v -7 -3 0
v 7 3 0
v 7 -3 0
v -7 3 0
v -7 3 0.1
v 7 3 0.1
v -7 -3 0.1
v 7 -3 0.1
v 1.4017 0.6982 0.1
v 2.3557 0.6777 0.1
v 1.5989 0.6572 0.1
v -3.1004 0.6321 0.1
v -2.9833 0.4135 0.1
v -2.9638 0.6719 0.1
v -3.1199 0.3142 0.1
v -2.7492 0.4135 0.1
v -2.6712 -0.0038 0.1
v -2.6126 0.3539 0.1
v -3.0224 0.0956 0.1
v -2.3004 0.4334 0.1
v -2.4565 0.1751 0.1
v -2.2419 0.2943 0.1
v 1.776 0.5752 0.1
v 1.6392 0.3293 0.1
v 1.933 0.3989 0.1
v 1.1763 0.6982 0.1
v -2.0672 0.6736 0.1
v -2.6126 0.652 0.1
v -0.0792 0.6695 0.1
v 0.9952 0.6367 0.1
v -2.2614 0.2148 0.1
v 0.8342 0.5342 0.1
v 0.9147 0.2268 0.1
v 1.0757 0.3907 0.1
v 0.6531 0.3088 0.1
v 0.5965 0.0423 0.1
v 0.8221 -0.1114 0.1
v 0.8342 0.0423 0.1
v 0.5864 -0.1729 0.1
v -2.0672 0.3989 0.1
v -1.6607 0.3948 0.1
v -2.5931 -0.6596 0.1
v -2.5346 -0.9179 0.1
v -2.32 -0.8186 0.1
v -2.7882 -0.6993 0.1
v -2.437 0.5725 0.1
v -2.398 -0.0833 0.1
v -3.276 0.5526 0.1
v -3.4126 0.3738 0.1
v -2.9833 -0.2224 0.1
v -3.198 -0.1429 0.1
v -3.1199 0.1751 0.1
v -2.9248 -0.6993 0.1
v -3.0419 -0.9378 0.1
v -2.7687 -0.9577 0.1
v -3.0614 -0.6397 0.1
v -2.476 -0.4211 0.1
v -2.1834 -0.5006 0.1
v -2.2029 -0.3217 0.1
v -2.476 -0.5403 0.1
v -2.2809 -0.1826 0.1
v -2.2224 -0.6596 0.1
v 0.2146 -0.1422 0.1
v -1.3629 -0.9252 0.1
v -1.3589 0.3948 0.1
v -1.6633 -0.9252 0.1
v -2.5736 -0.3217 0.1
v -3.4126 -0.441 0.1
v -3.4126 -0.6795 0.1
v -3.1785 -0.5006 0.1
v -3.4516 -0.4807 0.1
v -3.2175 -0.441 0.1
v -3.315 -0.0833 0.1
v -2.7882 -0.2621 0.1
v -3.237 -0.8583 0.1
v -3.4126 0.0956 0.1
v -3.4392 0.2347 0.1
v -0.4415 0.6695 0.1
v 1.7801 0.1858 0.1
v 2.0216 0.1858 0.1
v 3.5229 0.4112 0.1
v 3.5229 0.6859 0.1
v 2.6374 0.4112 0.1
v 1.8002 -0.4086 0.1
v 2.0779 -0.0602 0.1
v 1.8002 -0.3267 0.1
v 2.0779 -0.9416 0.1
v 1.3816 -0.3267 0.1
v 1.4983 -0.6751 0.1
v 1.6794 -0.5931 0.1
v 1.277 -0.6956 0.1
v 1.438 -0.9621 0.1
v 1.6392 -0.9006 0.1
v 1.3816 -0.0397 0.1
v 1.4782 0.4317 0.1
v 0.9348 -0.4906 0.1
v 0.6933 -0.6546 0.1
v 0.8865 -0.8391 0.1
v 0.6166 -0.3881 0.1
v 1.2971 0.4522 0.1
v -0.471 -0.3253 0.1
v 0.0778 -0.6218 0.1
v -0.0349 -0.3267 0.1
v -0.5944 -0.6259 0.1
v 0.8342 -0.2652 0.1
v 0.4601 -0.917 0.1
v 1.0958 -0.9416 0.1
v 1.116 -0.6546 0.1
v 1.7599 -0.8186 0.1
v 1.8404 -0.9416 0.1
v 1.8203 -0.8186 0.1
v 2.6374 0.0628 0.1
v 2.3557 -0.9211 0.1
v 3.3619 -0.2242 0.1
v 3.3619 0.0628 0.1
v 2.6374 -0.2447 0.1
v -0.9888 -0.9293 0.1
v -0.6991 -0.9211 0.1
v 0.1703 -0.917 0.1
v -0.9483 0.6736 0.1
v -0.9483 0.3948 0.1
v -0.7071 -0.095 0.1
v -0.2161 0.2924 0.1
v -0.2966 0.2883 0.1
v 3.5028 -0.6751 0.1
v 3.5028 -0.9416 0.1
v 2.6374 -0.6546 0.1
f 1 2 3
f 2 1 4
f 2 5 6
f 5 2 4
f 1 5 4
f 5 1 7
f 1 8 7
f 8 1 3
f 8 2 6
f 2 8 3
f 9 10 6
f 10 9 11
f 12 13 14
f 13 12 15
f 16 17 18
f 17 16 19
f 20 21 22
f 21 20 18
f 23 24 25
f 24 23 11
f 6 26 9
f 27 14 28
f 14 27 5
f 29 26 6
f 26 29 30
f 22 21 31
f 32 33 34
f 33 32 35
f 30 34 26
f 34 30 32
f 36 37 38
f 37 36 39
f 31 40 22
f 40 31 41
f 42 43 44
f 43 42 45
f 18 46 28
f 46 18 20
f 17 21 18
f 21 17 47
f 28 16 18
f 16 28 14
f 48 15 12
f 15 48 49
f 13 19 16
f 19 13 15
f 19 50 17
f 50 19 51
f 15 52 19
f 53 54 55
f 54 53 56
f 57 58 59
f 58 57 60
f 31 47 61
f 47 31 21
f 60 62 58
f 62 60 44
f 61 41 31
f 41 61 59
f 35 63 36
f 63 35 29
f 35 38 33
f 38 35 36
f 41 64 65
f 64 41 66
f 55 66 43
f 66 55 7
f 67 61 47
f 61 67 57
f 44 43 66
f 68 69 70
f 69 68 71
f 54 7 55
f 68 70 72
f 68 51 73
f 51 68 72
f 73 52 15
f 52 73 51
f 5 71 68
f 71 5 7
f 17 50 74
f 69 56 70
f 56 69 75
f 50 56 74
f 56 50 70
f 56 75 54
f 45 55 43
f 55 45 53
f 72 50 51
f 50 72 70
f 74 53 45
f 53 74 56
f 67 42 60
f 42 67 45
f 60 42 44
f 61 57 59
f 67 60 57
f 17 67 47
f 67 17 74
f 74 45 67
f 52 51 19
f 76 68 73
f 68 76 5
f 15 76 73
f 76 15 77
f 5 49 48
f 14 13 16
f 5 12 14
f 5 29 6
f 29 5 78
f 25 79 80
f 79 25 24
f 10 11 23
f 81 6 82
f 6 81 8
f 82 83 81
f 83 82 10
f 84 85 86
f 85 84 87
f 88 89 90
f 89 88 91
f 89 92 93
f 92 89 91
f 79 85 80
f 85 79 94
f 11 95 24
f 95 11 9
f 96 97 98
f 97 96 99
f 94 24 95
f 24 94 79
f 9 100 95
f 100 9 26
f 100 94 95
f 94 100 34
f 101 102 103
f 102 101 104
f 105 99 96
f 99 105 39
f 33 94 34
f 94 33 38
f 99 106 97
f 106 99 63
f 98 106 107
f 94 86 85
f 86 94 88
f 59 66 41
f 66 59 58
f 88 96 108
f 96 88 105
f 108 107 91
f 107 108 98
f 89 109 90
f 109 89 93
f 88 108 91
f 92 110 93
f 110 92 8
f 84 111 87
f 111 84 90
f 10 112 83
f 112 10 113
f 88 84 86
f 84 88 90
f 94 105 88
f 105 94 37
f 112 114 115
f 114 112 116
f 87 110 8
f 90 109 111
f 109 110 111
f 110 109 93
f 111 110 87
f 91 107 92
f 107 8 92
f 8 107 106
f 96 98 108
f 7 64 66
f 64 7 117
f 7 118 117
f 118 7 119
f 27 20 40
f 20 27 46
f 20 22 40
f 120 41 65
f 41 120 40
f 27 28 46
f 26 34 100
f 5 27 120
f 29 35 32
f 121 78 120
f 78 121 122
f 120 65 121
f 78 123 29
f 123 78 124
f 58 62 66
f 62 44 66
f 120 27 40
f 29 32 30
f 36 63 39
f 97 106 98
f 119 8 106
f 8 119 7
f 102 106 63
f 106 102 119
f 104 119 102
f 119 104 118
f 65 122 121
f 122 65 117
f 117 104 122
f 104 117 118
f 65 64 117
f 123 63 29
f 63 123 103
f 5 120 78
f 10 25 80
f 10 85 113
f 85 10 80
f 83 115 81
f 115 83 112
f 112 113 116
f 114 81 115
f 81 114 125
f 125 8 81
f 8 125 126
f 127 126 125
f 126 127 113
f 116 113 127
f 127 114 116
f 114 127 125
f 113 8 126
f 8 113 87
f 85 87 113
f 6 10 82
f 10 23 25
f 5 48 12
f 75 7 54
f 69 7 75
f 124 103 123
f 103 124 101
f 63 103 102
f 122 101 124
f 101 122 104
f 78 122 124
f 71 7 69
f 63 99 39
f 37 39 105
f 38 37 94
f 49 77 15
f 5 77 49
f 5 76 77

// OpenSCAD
// file: ../p/box5-12.scad
use <../lib.scad>
function ldraw_lib__box5_12() = [
// 0 Box with 5 Faces without Any Edges
// 0 Name: box5-12.dat
// 0 Author: Chris Dee [cwdee]
// 0 !LDRAW_ORG Primitive UPDATE 2009-02
// 0 !LICENSE Licensed under CC BY 4.0 : see CAreadme.txt
// 
// 0 BFC CERTIFY CCW
  [0,"BFC","CERTIFY"],
  [0,"BFC","CCW"],
// 
// 0 !HISTORY 2009-09-03 [PTadmin] Official Update 2009-02
// 
// 
// 4 16 1 1 1 1 1 -1 -1 1 -1 -1 1 1
  [4,16,1,1,1,1,1,-1,-1,1,-1,-1,1,1],
// 4 16 -1 0 1 1 0 1 1 1 1 -1 1 1
  [4,16,-1,0,1,1,0,1,1,1,1,-1,1,1],
// 4 16 -1 0 -1 -1 0 1 -1 1 1 -1 1 -1
  [4,16,-1,0,-1,-1,0,1,-1,1,1,-1,1,-1],
// 4 16 1 0 -1 -1 0 -1 -1 1 -1 1 1 -1
  [4,16,1,0,-1,-1,0,-1,-1,1,-1,1,1,-1],
// 4 16 1 0 1 1 0 -1 1 1 -1 1 1 1
  [4,16,1,0,1,1,0,-1,1,1,-1,1,1,1],
// 0
];
module ldraw_lib__box5_12(step=0, col=false, unit=2/5, alt=false, line=0.2, solid=!$preview)
    makepoly(ldraw_lib__box5_12(), step=step, col=col, unit=unit, alt=alt, line=line, solid=solid);
ldraw_lib__box5_12(line=0.2);
// main file
use <../lib.scad>
use <../p/box5-12.scad>
function ldraw_lib__6255869g() = [
// 0 Sticker  0.8 x  1.8 with Silver "STAGE"
// 0 Name: 6255869g.dat
// 0 Author: Magnus Forsberg [MagFors]
// 0 !LDRAW_ORG Part UPDATE 2024-08
// 0 !LICENSE Licensed under CC BY 4.0 : see CAreadme.txt
// 
// 0 BFC CERTIFY CCW
  [0,"BFC","CERTIFY"],
  [0,"BFC","CCW"],
// 
// 0 !KEYWORDS Bricklink 75893stk01, Brickowl 472633, Dodge, Rebrickable 49146
// 0 !KEYWORDS set 75893, Speed Champions
// 
// 0 !HISTORY 2024-09-30 [OrionP] Official Update 2024-08
// 
// 
// 1 16 0 -0.25 0 17.5 0 0 0 0.25 0 0 0 7.5 box5-12.dat
  [1,16,0,-0.25,0,17.5,0,0,0,0.25,0,0,0,7.5, ldraw_lib__box5_12()],
// 4 0 5.88926 -0.25 1.69427 17.5 -0.25 7.5 3.50432 -0.25 1.74552 3.99737 -0.25 1.64303
  [4,0,5.88926,-0.25,1.69427,17.5,-0.25,7.5,3.50432,-0.25,1.74552,3.99737,-0.25,1.64303],
// 4 80 -7.45835 -0.25 1.03385 -7.40958 -0.25 1.67971 -7.75102 -0.25 1.58034 -7.7998 -0.25 0.78544
  [4,80,-7.45835,-0.25,1.03385,-7.40958,-0.25,1.67971,-7.75102,-0.25,1.58034,-7.7998,-0.25,0.78544],
// 4 0 -6.67791 -0.25 -0.00946 -6.53157 -0.25 0.8848 -6.87302 -0.25 1.03385 -7.55591 -0.25 0.23895
  [4,0,-6.67791,-0.25,-0.00946,-6.53157,-0.25,0.8848,-6.87302,-0.25,1.03385,-7.55591,-0.25,0.23895],
// 4 80 -6.14135 -0.25 0.43767 -5.60479 -0.25 0.73576 -5.75112 -0.25 1.08353 -6.53157 -0.25 0.8848
  [4,80,-6.14135,-0.25,0.43767,-5.60479,-0.25,0.73576,-5.75112,-0.25,1.08353,-6.53157,-0.25,0.8848],
// 4 80 4.09799 -0.25 0.82314 4.83254 -0.25 0.99737 4.44011 -0.25 1.43806 3.99737 -0.25 1.64303
  [4,80,4.09799,-0.25,0.82314,4.83254,-0.25,0.99737,4.44011,-0.25,1.43806,3.99737,-0.25,1.64303],
// 3 0 17.5 -0.25 7.5 2.94083 -0.25 1.74552 3.50432 -0.25 1.74552
  [3,0,17.5,-0.25,7.5,2.94083,-0.25,1.74552,3.50432,-0.25,1.74552],
// 4 0 -5.16812 -0.25 1.68403 -17.5 -0.25 7.5 -7.40958 -0.25 1.67971 -6.53157 -0.25 1.63002
  [4,0,-5.16812,-0.25,1.68403,-17.5,-0.25,7.5,-7.40958,-0.25,1.67971,-6.53157,-0.25,1.63002],
// 4 0 2.94083 -0.25 1.74552 17.5 -0.25 7.5 -0.19804 -0.25 1.67378 2.48803 -0.25 1.59179
  [4,0,2.94083,-0.25,1.74552,17.5,-0.25,7.5,-0.19804,-0.25,1.67378,2.48803,-0.25,1.59179],
// 3 80 -5.60479 -0.25 0.73576 -6.14135 -0.25 0.43767 -5.65357 -0.25 0.53703
  [3,80,-5.60479,-0.25,0.73576,-6.14135,-0.25,0.43767,-5.65357,-0.25,0.53703],
// 4 80 2.28678 -0.25 0.56693 2.68927 -0.25 0.97687 2.08553 -0.25 1.33557 1.63273 -0.25 0.7719
  [4,80,2.28678,-0.25,0.56693,2.68927,-0.25,0.97687,2.08553,-0.25,1.33557,1.63273,-0.25,0.7719],
// 4 80 2.68927 -0.25 0.97687 2.94083 -0.25 1.74552 2.48803 -0.25 1.59179 2.08553 -0.25 1.33557
  [4,80,2.68927,-0.25,0.97687,2.94083,-0.25,1.74552,2.48803,-0.25,1.59179,2.08553,-0.25,1.33557],
// 4 80 1.49117 -0.25 0.10574 1.46602 -0.25 -0.43231 2.05535 -0.25 -0.27858 2.08553 -0.25 0.10574
  [4,80,1.49117,-0.25,0.10574,1.46602,-0.25,-0.43231,2.05535,-0.25,-0.27858,2.08553,-0.25,0.10574],
// 4 0 -5.16812 -0.25 0.99737 -5.60479 -0.25 0.73576 -5.65357 -0.25 0.53703 -4.15183 -0.25 0.98712
  [4,0,-5.16812,-0.25,0.99737,-5.60479,-0.25,0.73576,-5.65357,-0.25,0.53703,-4.15183,-0.25,0.98712],
// 4 80 -6.33646 -0.25 -2.2948 -5.7999 -0.25 -2.0464 -6.48279 -0.25 -1.64895 -6.97057 -0.25 -1.74831
  [4,80,-6.33646,-0.25,-2.2948,-5.7999,-0.25,-2.0464,-6.48279,-0.25,-1.64895,-6.97057,-0.25,-1.74831],
// 4 80 -6.53157 -0.25 0.8848 -5.75112 -0.25 1.08353 -6.09257 -0.25 1.4313 -6.53157 -0.25 1.63002
  [4,80,-6.53157,-0.25,0.8848,-5.75112,-0.25,1.08353,-6.09257,-0.25,1.4313,-6.53157,-0.25,1.63002],
// 4 0 -6.14135 -0.25 0.43767 -6.53157 -0.25 0.8848 -6.67791 -0.25 -0.00946 -5.99501 -0.25 -0.20819
  [4,0,-6.14135,-0.25,0.43767,-6.53157,-0.25,0.8848,-6.67791,-0.25,-0.00946,-5.99501,-0.25,-0.20819],
// 4 80 -6.87302 -0.25 1.03385 -6.53157 -0.25 0.8848 -6.53157 -0.25 1.63002 -7.40958 -0.25 1.67971
  [4,80,-6.87302,-0.25,1.03385,-6.53157,-0.25,0.8848,-6.53157,-0.25,1.63002,-7.40958,-0.25,1.67971],
// 4 80 -7.7998 -0.25 0.78544 -7.75102 -0.25 1.58034 -8.19003 -0.25 1.38162 -8.53147 -0.25 0.93449
  [4,80,-7.7998,-0.25,0.78544,-7.75102,-0.25,1.58034,-8.19003,-0.25,1.38162,-8.53147,-0.25,0.93449],
// 4 0 -7.55591 -0.25 0.23895 -6.87302 -0.25 1.03385 -7.45835 -0.25 1.03385 -7.7998 -0.25 0.78544
  [4,0,-7.55591,-0.25,0.23895,-6.87302,-0.25,1.03385,-7.45835,-0.25,1.03385,-7.7998,-0.25,0.78544],
// 4 80 -7.55591 -0.25 0.23895 -7.99491 -0.25 -0.35723 -7.45835 -0.25 -0.55596 -6.67791 -0.25 -0.00946
  [4,80,-7.55591,-0.25,0.23895,-7.99491,-0.25,-0.35723,-7.45835,-0.25,-0.55596,-6.67791,-0.25,-0.00946],
// 3 0 -7.7998 -0.25 0.78544 -7.7998 -0.25 0.43767 -7.55591 -0.25 0.23895
  [3,0,-7.7998,-0.25,0.78544,-7.7998,-0.25,0.43767,-7.55591,-0.25,0.23895],
// 4 80 -7.31202 -0.25 -1.74831 -7.65347 -0.25 -1.59926 -7.60469 -0.25 -2.34448 -6.9218 -0.25 -2.39417
  [4,80,-7.31202,-0.25,-1.74831,-7.65347,-0.25,-1.59926,-7.60469,-0.25,-2.34448,-6.9218,-0.25,-2.39417],
// 4 80 -5.45845 -0.25 -1.25149 -5.50723 -0.25 -0.80436 -6.19012 -0.25 -1.05277 -6.19012 -0.25 -1.35086
  [4,80,-5.45845,-0.25,-1.25149,-5.50723,-0.25,-0.80436,-6.19012,-0.25,-1.05277,-6.19012,-0.25,-1.35086],
// 4 0 -5.65357 -0.25 0.53703 -6.14135 -0.25 0.43767 -5.99501 -0.25 -0.20819 -5.70234 -0.25 -0.45659
  [4,0,-5.65357,-0.25,0.53703,-6.14135,-0.25,0.43767,-5.99501,-0.25,-0.20819,-5.70234,-0.25,-0.45659],
// 4 80 -6.19012 -0.25 -1.35086 -5.7999 -0.25 -2.0464 -5.55601 -0.25 -1.64895 -5.45845 -0.25 -1.25149
  [4,80,-6.19012,-0.25,-1.35086,-5.7999,-0.25,-2.0464,-5.55601,-0.25,-1.64895,-5.45845,-0.25,-1.25149],
// 4 0 -4.15183 -0.25 0.98712 -5.65357 -0.25 0.53703 -5.70234 -0.25 -0.45659 -5.50723 -0.25 -0.80436
  [4,0,-4.15183,-0.25,0.98712,-5.65357,-0.25,0.53703,-5.70234,-0.25,-0.45659,-5.50723,-0.25,-0.80436],
// 4 0 0.5365 -0.25 -0.35545 1.49117 -0.25 0.10574 1.63273 -0.25 0.7719 -0.19804 -0.25 1.67378
  [4,0,0.5365,-0.25,-0.35545,1.49117,-0.25,0.10574,1.63273,-0.25,0.7719,-0.19804,-0.25,1.67378],
// 4 80 1.63273 -0.25 0.7719 1.49117 -0.25 0.10574 2.08553 -0.25 0.10574 2.28678 -0.25 0.56693
  [4,80,1.63273,-0.25,0.7719,1.49117,-0.25,0.10574,2.08553,-0.25,0.10574,2.28678,-0.25,0.56693],
// 4 80 -4.15817 -0.25 -2.31293 -3.40723 -0.25 -2.31293 -3.39716 -0.25 0.98712 -4.15183 -0.25 0.98712
  [4,80,-4.15817,-0.25,-2.31293,-3.40723,-0.25,-2.31293,-3.39716,-0.25,0.98712,-4.15183,-0.25,0.98712],
// 4 0 -6.33646 -0.25 -2.2948 -6.9218 -0.25 -2.39417 -17.5 -0.25 -7.5 -4.15817 -0.25 -2.31293
  [4,0,-6.33646,-0.25,-2.2948,-6.9218,-0.25,-2.39417,-17.5,-0.25,-7.5,-4.15817,-0.25,-2.31293],
// 4 80 -6.43401 -0.25 -0.80436 -6.19012 -0.25 -1.05277 -5.70234 -0.25 -0.45659 -5.99501 -0.25 -0.20819
  [4,80,-6.43401,-0.25,-0.80436,-6.19012,-0.25,-1.05277,-5.70234,-0.25,-0.45659,-5.99501,-0.25,-0.20819],
// 3 0 -5.7999 -0.25 -2.0464 -6.33646 -0.25 -2.2948 -4.15817 -0.25 -2.31293
  [3,0,-5.7999,-0.25,-2.0464,-6.33646,-0.25,-2.2948,-4.15817,-0.25,-2.31293],
// 4 80 -8.62903 -0.25 -1.20181 -8.53147 -0.25 -1.69863 -7.94613 -0.25 -1.25149 -8.53147 -0.25 -1.10245
  [4,80,-8.62903,-0.25,-1.20181,-8.53147,-0.25,-1.69863,-7.94613,-0.25,-1.25149,-8.53147,-0.25,-1.10245],
// 3 0 -7.60469 -0.25 -2.34448 -17.5 -0.25 -7.5 -6.9218 -0.25 -2.39417
  [3,0,-7.60469,-0.25,-2.34448,-17.5,-0.25,-7.5,-6.9218,-0.25,-2.39417],
// 3 80 -8.53147 -0.25 -1.10245 -7.94613 -0.25 -1.25149 -8.04369 -0.25 -1.10245
  [3,80,-8.53147,-0.25,-1.10245,-7.94613,-0.25,-1.25149,-8.04369,-0.25,-1.10245],
// 4 0 -7.99491 -0.25 -0.35723 -8.28758 -0.25 -0.20819 -8.53147 -0.25 -1.10245 -8.04369 -0.25 -1.10245
  [4,0,-7.99491,-0.25,-0.35723,-8.28758,-0.25,-0.20819,-8.53147,-0.25,-1.10245,-8.04369,-0.25,-1.10245],
// 4 80 -7.99491 -0.25 -0.35723 -7.7998 -0.25 0.43767 -7.7998 -0.25 0.78544 -8.28758 -0.25 -0.20819
  [4,80,-7.99491,-0.25,-0.35723,-7.7998,-0.25,0.43767,-7.7998,-0.25,0.78544,-8.28758,-0.25,-0.20819],
// 4 0 -17.5 -0.25 -7.5 -8.62903 -0.25 -1.20181 -8.53147 -0.25 -1.10245 -17.5 -0.25 7.5
  [4,0,-17.5,-0.25,-7.5,-8.62903,-0.25,-1.20181,-8.53147,-0.25,-1.10245,-17.5,-0.25,7.5],
// 3 80 -6.67791 -0.25 -0.00946 -7.45835 -0.25 -0.55596 -6.97057 -0.25 -0.65532
  [3,80,-6.67791,-0.25,-0.00946,-7.45835,-0.25,-0.55596,-6.97057,-0.25,-0.65532],
// 4 80 -7.65347 -0.25 -1.59926 -7.94613 -0.25 -1.25149 -8.53147 -0.25 -1.69863 -8.09247 -0.25 -2.14576
  [4,80,-7.65347,-0.25,-1.59926,-7.94613,-0.25,-1.25149,-8.53147,-0.25,-1.69863,-8.09247,-0.25,-2.14576],
// 4 0 -7.65347 -0.25 -1.59926 -6.97057 -0.25 -0.65532 -7.45835 -0.25 -0.55596 -7.94613 -0.25 -1.25149
  [4,0,-7.65347,-0.25,-1.59926,-6.97057,-0.25,-0.65532,-7.45835,-0.25,-0.55596,-7.94613,-0.25,-1.25149],
// 3 80 -7.65347 -0.25 -1.59926 -8.09247 -0.25 -2.14576 -7.60469 -0.25 -2.34448
  [3,80,-7.65347,-0.25,-1.59926,-8.09247,-0.25,-2.14576,-7.60469,-0.25,-2.34448],
// 4 80 -6.97057 -0.25 -1.74831 -7.31202 -0.25 -1.74831 -6.9218 -0.25 -2.39417 -6.33646 -0.25 -2.2948
  [4,80,-6.97057,-0.25,-1.74831,-7.31202,-0.25,-1.74831,-6.9218,-0.25,-2.39417,-6.33646,-0.25,-2.2948],
// 4 0 -8.04369 -0.25 -1.10245 -7.94613 -0.25 -1.25149 -7.45835 -0.25 -0.55596 -7.99491 -0.25 -0.35723
  [4,0,-8.04369,-0.25,-1.10245,-7.94613,-0.25,-1.25149,-7.45835,-0.25,-0.55596,-7.99491,-0.25,-0.35723],
// 4 0 -6.97057 -0.25 -0.65532 -7.65347 -0.25 -1.59926 -7.31202 -0.25 -1.74831 -6.97057 -0.25 -1.74831
  [4,0,-6.97057,-0.25,-0.65532,-7.65347,-0.25,-1.59926,-7.31202,-0.25,-1.74831,-6.97057,-0.25,-1.74831],
// 4 0 -6.43401 -0.25 -0.80436 -6.97057 -0.25 -1.74831 -6.48279 -0.25 -1.64895 -6.19012 -0.25 -1.35086
  [4,0,-6.43401,-0.25,-0.80436,-6.97057,-0.25,-1.74831,-6.48279,-0.25,-1.64895,-6.19012,-0.25,-1.35086],
// 3 80 -6.19012 -0.25 -1.35086 -6.48279 -0.25 -1.64895 -5.7999 -0.25 -2.0464
  [3,80,-6.19012,-0.25,-1.35086,-6.48279,-0.25,-1.64895,-5.7999,-0.25,-2.0464],
// 3 80 -5.70234 -0.25 -0.45659 -6.19012 -0.25 -1.05277 -5.50723 -0.25 -0.80436
  [3,80,-5.70234,-0.25,-0.45659,-6.19012,-0.25,-1.05277,-5.50723,-0.25,-0.80436],
// 3 0 -6.43401 -0.25 -0.80436 -6.19012 -0.25 -1.35086 -6.19012 -0.25 -1.05277
  [3,0,-6.43401,-0.25,-0.80436,-6.19012,-0.25,-1.35086,-6.19012,-0.25,-1.05277],
// 4 80 -6.43401 -0.25 -0.80436 -5.99501 -0.25 -0.20819 -6.67791 -0.25 -0.00946 -6.97057 -0.25 -0.65532
  [4,80,-6.43401,-0.25,-0.80436,-5.99501,-0.25,-0.20819,-6.67791,-0.25,-0.00946,-6.97057,-0.25,-0.65532],
// 3 0 -6.97057 -0.25 -0.65532 -6.97057 -0.25 -1.74831 -6.43401 -0.25 -0.80436
  [3,0,-6.97057,-0.25,-0.65532,-6.97057,-0.25,-1.74831,-6.43401,-0.25,-0.80436],
// 3 80 -7.7998 -0.25 0.43767 -7.99491 -0.25 -0.35723 -7.55591 -0.25 0.23895
  [3,80,-7.7998,-0.25,0.43767,-7.99491,-0.25,-0.35723,-7.55591,-0.25,0.23895],
// 4 0 -17.5 -0.25 7.5 -8.53147 -0.25 -1.10245 -8.28758 -0.25 -0.20819 -8.53147 -0.25 0.23895
  [4,0,-17.5,-0.25,7.5,-8.53147,-0.25,-1.10245,-8.28758,-0.25,-0.20819,-8.53147,-0.25,0.23895],
// 4 80 -8.53147 -0.25 0.23895 -8.28758 -0.25 -0.20819 -7.7998 -0.25 0.78544 -8.598 -0.25 0.58672
  [4,80,-8.53147,-0.25,0.23895,-8.28758,-0.25,-0.20819,-7.7998,-0.25,0.78544,-8.598,-0.25,0.58672],
// 3 0 -17.5 -0.25 7.5 -8.53147 -0.25 0.93449 -8.19003 -0.25 1.38162
  [3,0,-17.5,-0.25,7.5,-8.53147,-0.25,0.93449,-8.19003,-0.25,1.38162],
// 3 80 -7.40958 -0.25 1.67971 -7.45835 -0.25 1.03385 -6.87302 -0.25 1.03385
  [3,80,-7.40958,-0.25,1.67971,-7.45835,-0.25,1.03385,-6.87302,-0.25,1.03385],
// 3 0 -17.5 -0.25 7.5 -7.75102 -0.25 1.58034 -7.40958 -0.25 1.67971
  [3,0,-17.5,-0.25,7.5,-7.75102,-0.25,1.58034,-7.40958,-0.25,1.67971],
// 4 0 17.5 -0.25 7.5 -17.5 -0.25 7.5 -1.10365 -0.25 1.67378 -0.19804 -0.25 1.67378
  [4,0,17.5,-0.25,7.5,-17.5,-0.25,7.5,-1.10365,-0.25,1.67378,-0.19804,-0.25,1.67378],
// 4 80 4.45017 -0.25 0.46444 5.05391 -0.25 0.46444 4.83254 -0.25 0.99737 4.09799 -0.25 0.82314
  [4,80,4.45017,-0.25,0.46444,5.05391,-0.25,0.46444,4.83254,-0.25,0.99737,4.09799,-0.25,0.82314],
// 3 0 5.88926 -0.25 1.69427 3.99737 -0.25 1.64303 4.44011 -0.25 1.43806
  [3,0,5.88926,-0.25,1.69427,3.99737,-0.25,1.64303,4.44011,-0.25,1.43806],
// 4 0 8.80732 -0.25 1.02811 17.5 -0.25 -7.5 17.5 -0.25 7.5 8.80732 -0.25 1.71477
  [4,0,8.80732,-0.25,1.02811,17.5,-0.25,-7.5,17.5,-0.25,7.5,8.80732,-0.25,1.71477],
// 4 80 8.80732 -0.25 1.71477 5.88926 -0.25 1.69427 6.59362 -0.25 1.02811 8.80732 -0.25 1.02811
  [4,80,8.80732,-0.25,1.71477,5.88926,-0.25,1.69427,6.59362,-0.25,1.02811,8.80732,-0.25,1.02811],
// 4 80 4.50048 -0.25 -1.02161 5.19478 -0.25 -2.35393 5.19478 -0.25 -0.15048 4.50048 -0.25 -0.81664
  [4,80,4.50048,-0.25,-1.02161,5.19478,-0.25,-2.35393,5.19478,-0.25,-0.15048,4.50048,-0.25,-0.81664],
// 4 0 3.74581 -0.25 -1.68777 4.19861 -0.25 -1.4828 3.454 -0.25 -0.81664 3.19238 -0.25 -1.73901
  [4,0,3.74581,-0.25,-1.68777,4.19861,-0.25,-1.4828,3.454,-0.25,-0.81664,3.19238,-0.25,-1.73901],
// 4 80 3.74581 -0.25 -1.68777 3.19238 -0.25 -1.73901 3.59488 -0.25 -2.40517 4.09799 -0.25 -2.25144
  [4,80,3.74581,-0.25,-1.68777,3.19238,-0.25,-1.73901,3.59488,-0.25,-2.40517,4.09799,-0.25,-2.25144],
// 4 0 3.454 -0.25 -0.09923 5.19478 -0.25 -0.15048 5.05391 -0.25 0.46444 4.45017 -0.25 0.46444
  [4,0,3.454,-0.25,-0.09923,5.19478,-0.25,-0.15048,5.05391,-0.25,0.46444,4.45017,-0.25,0.46444],
// 4 80 3.6955 -0.25 1.07936 4.09799 -0.25 0.82314 3.99737 -0.25 1.64303 3.50432 -0.25 1.74552
  [4,80,3.6955,-0.25,1.07936,4.09799,-0.25,0.82314,3.99737,-0.25,1.64303,3.50432,-0.25,1.74552],
// 4 80 2.33709 -0.25 -1.22658 1.54149 -0.25 -0.97037 1.73335 -0.25 -1.63653 2.21634 -0.25 -2.09771
  [4,80,2.33709,-0.25,-1.22658,1.54149,-0.25,-0.97037,1.73335,-0.25,-1.63653,2.21634,-0.25,-2.09771],
// 4 0 3.454 -0.25 -0.09923 4.45017 -0.25 0.46444 4.09799 -0.25 0.82314 3.6955 -0.25 1.07936
  [4,0,3.454,-0.25,-0.09923,4.45017,-0.25,0.46444,4.09799,-0.25,0.82314,3.6955,-0.25,1.07936],
// 4 80 3.2427 -0.25 1.1306 3.6955 -0.25 1.07936 3.50432 -0.25 1.74552 2.94083 -0.25 1.74552
  [4,80,3.2427,-0.25,1.1306,3.6955,-0.25,1.07936,3.50432,-0.25,1.74552,2.94083,-0.25,1.74552],
// 4 0 3.454 -0.25 -0.09923 3.6955 -0.25 1.07936 3.2427 -0.25 1.1306 2.68927 -0.25 0.97687
  [4,0,3.454,-0.25,-0.09923,3.6955,-0.25,1.07936,3.2427,-0.25,1.1306,2.68927,-0.25,0.97687],
// 4 80 -1.17744 -0.25 -0.81322 -1.48601 -0.25 -1.56479 0.19439 -0.25 -1.55454 -0.08736 -0.25 -0.81664
  [4,80,-1.17744,-0.25,-0.81322,-1.48601,-0.25,-1.56479,0.19439,-0.25,-1.55454,-0.08736,-0.25,-0.81664],
// 4 80 2.08553 -0.25 -0.66291 1.46602 -0.25 -0.43231 1.54149 -0.25 -0.97037 2.33709 -0.25 -1.22658
  [4,80,2.08553,-0.25,-0.66291,1.46602,-0.25,-0.43231,1.54149,-0.25,-0.97037,2.33709,-0.25,-1.22658],
// 4 0 3.454 -0.25 -0.09923 2.68927 -0.25 0.97687 2.28678 -0.25 0.56693 2.08553 -0.25 0.10574
  [4,0,3.454,-0.25,-0.09923,2.68927,-0.25,0.97687,2.28678,-0.25,0.56693,2.08553,-0.25,0.10574],
// 4 0 0.5365 -0.25 -0.35545 1.1503 -0.25 -2.29244 1.73335 -0.25 -1.63653 1.54149 -0.25 -0.97037
  [4,0,0.5365,-0.25,-0.35545,1.1503,-0.25,-2.29244,1.73335,-0.25,-1.63653,1.54149,-0.25,-0.97037],
// 3 0 2.21634 -0.25 -2.09771 1.1503 -0.25 -2.29244 2.73958 -0.25 -2.35393
  [3,0,2.21634,-0.25,-2.09771,1.1503,-0.25,-2.29244,2.73958,-0.25,-2.35393],
// 4 80 3.454 -0.25 -0.09923 3.454 -0.25 -0.81664 4.50048 -0.25 -0.81664 5.19478 -0.25 -0.15048
  [4,80,3.454,-0.25,-0.09923,3.454,-0.25,-0.81664,4.50048,-0.25,-0.81664,5.19478,-0.25,-0.15048],
// 4 0 -5.50723 -0.25 -0.80436 -5.45845 -0.25 -1.25149 -4.15817 -0.25 -2.31293 -4.15183 -0.25 0.98712
  [4,0,-5.50723,-0.25,-0.80436,-5.45845,-0.25,-1.25149,-4.15817,-0.25,-2.31293,-4.15183,-0.25,0.98712],
// 4 0 3.454 -0.25 -0.81664 2.08553 -0.25 -0.66291 2.33709 -0.25 -1.22658 2.78989 -0.25 -1.63653
  [4,0,3.454,-0.25,-0.81664,2.08553,-0.25,-0.66291,2.33709,-0.25,-1.22658,2.78989,-0.25,-1.63653],
// 4 80 2.78989 -0.25 -1.63653 2.21634 -0.25 -2.09771 2.73958 -0.25 -2.35393 3.19238 -0.25 -1.73901
  [4,80,2.78989,-0.25,-1.63653,2.21634,-0.25,-2.09771,2.73958,-0.25,-2.35393,3.19238,-0.25,-1.73901],
// 4 80 3.74581 -0.25 -1.68777 4.09799 -0.25 -2.25144 4.39986 -0.25 -2.04647 4.19861 -0.25 -1.4828
  [4,80,3.74581,-0.25,-1.68777,4.09799,-0.25,-2.25144,4.39986,-0.25,-2.04647,4.19861,-0.25,-1.4828],
// 3 0 3.454 -0.25 -0.81664 2.78989 -0.25 -1.63653 3.19238 -0.25 -1.73901
  [3,0,3.454,-0.25,-0.81664,2.78989,-0.25,-1.63653,3.19238,-0.25,-1.73901],
// 4 0 4.6011 -0.25 -2.35393 4.09799 -0.25 -2.25144 3.59488 -0.25 -2.40517 17.5 -0.25 -7.5
  [4,0,4.6011,-0.25,-2.35393,4.09799,-0.25,-2.25144,3.59488,-0.25,-2.40517,17.5,-0.25,-7.5],
// 4 80 4.50048 -0.25 -1.02161 4.19861 -0.25 -1.4828 4.55079 -0.25 -2.04647 5.19478 -0.25 -2.35393
  [4,80,4.50048,-0.25,-1.02161,4.19861,-0.25,-1.4828,4.55079,-0.25,-2.04647,5.19478,-0.25,-2.35393],
// 4 80 5.88926 -0.25 -2.30269 6.59362 -0.25 0.15698 6.59362 -0.25 1.02811 5.88926 -0.25 1.69427
  [4,80,5.88926,-0.25,-2.30269,6.59362,-0.25,0.15698,6.59362,-0.25,1.02811,5.88926,-0.25,1.69427],
// 4 0 4.50048 -0.25 -1.02161 4.50048 -0.25 -0.81664 3.454 -0.25 -0.81664 4.19861 -0.25 -1.4828
  [4,0,4.50048,-0.25,-1.02161,4.50048,-0.25,-0.81664,3.454,-0.25,-0.81664,4.19861,-0.25,-1.4828],
// 4 0 2.08553 -0.25 -0.66291 3.454 -0.25 -0.81664 3.454 -0.25 -0.09923 2.05535 -0.25 -0.27858
  [4,0,2.08553,-0.25,-0.66291,3.454,-0.25,-0.81664,3.454,-0.25,-0.09923,2.05535,-0.25,-0.27858],
// 4 80 8.40483 -0.25 -0.56042 8.40483 -0.25 0.15698 6.59362 -0.25 0.15698 6.59362 -0.25 -0.61166
  [4,80,8.40483,-0.25,-0.56042,8.40483,-0.25,0.15698,6.59362,-0.25,0.15698,6.59362,-0.25,-0.61166],
// 3 0 5.19478 -0.25 -2.35393 4.6011 -0.25 -2.35393 17.5 -0.25 -7.5
  [3,0,5.19478,-0.25,-2.35393,4.6011,-0.25,-2.35393,17.5,-0.25,-7.5],
// 3 80 4.19861 -0.25 -1.4828 4.39986 -0.25 -2.04647 4.55079 -0.25 -2.04647
  [3,80,4.19861,-0.25,-1.4828,4.39986,-0.25,-2.04647,4.55079,-0.25,-2.04647],
// 4 0 4.6011 -0.25 -2.35393 4.55079 -0.25 -2.04647 4.39986 -0.25 -2.04647 4.09799 -0.25 -2.25144
  [4,0,4.6011,-0.25,-2.35393,4.55079,-0.25,-2.04647,4.39986,-0.25,-2.04647,4.09799,-0.25,-2.25144],
// 3 80 4.55079 -0.25 -2.04647 4.6011 -0.25 -2.35393 5.19478 -0.25 -2.35393
  [3,80,4.55079,-0.25,-2.04647,4.6011,-0.25,-2.35393,5.19478,-0.25,-2.35393],
// 3 80 3.19238 -0.25 -1.73901 2.73958 -0.25 -2.35393 3.59488 -0.25 -2.40517
  [3,80,3.19238,-0.25,-1.73901,2.73958,-0.25,-2.35393,3.59488,-0.25,-2.40517],
// 4 0 17.5 -0.25 -7.5 3.59488 -0.25 -2.40517 2.73958 -0.25 -2.35393 1.1503 -0.25 -2.29244
  [4,0,17.5,-0.25,-7.5,3.59488,-0.25,-2.40517,2.73958,-0.25,-2.35393,1.1503,-0.25,-2.29244],
// 3 80 2.33709 -0.25 -1.22658 2.21634 -0.25 -2.09771 2.78989 -0.25 -1.63653
  [3,80,2.33709,-0.25,-1.22658,2.21634,-0.25,-2.09771,2.78989,-0.25,-1.63653],
// 4 0 -3.40723 -0.25 -2.31293 -4.15817 -0.25 -2.31293 -17.5 -0.25 -7.5 -2.47212 -0.25 -2.32318
  [4,0,-3.40723,-0.25,-2.31293,-4.15817,-0.25,-2.31293,-17.5,-0.25,-7.5,-2.47212,-0.25,-2.32318],
// 4 0 -1.74763 -0.25 -2.30269 -2.47212 -0.25 -2.32318 -17.5 -0.25 -7.5 0.42582 -0.25 -2.29244
  [4,0,-1.74763,-0.25,-2.30269,-2.47212,-0.25,-2.32318,-17.5,-0.25,-7.5,0.42582,-0.25,-2.29244],
// 4 0 -5.16812 -0.25 0.99737 -5.16812 -0.25 1.68403 -6.09257 -0.25 1.4313 -5.75112 -0.25 1.08353
  [4,0,-5.16812,-0.25,0.99737,-5.16812,-0.25,1.68403,-6.09257,-0.25,1.4313,-5.75112,-0.25,1.08353],
// 3 0 -5.75112 -0.25 1.08353 -5.60479 -0.25 0.73576 -5.16812 -0.25 0.99737
  [3,0,-5.75112,-0.25,1.08353,-5.60479,-0.25,0.73576,-5.16812,-0.25,0.99737],
// 4 80 -4.15183 -0.25 0.98712 -3.39716 -0.25 0.98712 -2.37081 -0.25 1.68403 -5.16812 -0.25 0.99737
  [4,80,-4.15183,-0.25,0.98712,-3.39716,-0.25,0.98712,-2.37081,-0.25,1.68403,-5.16812,-0.25,0.99737],
// 3 0 -5.16812 -0.25 1.68403 -6.53157 -0.25 1.63002 -6.09257 -0.25 1.4313
  [3,0,-5.16812,-0.25,1.68403,-6.53157,-0.25,1.63002,-6.09257,-0.25,1.4313],
// 3 80 2.94083 -0.25 1.74552 2.68927 -0.25 0.97687 3.2427 -0.25 1.1306
  [3,80,2.94083,-0.25,1.74552,2.68927,-0.25,0.97687,3.2427,-0.25,1.1306],
// 3 0 -17.5 -0.25 7.5 -5.16812 -0.25 1.68403 -2.37081 -0.25 1.68403
  [3,0,-17.5,-0.25,7.5,-5.16812,-0.25,1.68403,-2.37081,-0.25,1.68403],
// 3 0 -0.19804 -0.25 1.67378 1.63273 -0.25 0.7719 2.08553 -0.25 1.33557
  [3,0,-0.19804,-0.25,1.67378,1.63273,-0.25,0.7719,2.08553,-0.25,1.33557],
// 4 0 -1.10365 -0.25 1.67378 -2.37081 -0.25 1.68403 -2.37081 -0.25 0.98712 -1.76776 -0.25 -0.23759
  [4,0,-1.10365,-0.25,1.67378,-2.37081,-0.25,1.68403,-2.37081,-0.25,0.98712,-1.76776,-0.25,-0.23759],
// 3 80 -2.37081 -0.25 1.68403 -3.39716 -0.25 0.98712 -2.37081 -0.25 0.98712
  [3,80,-2.37081,-0.25,1.68403,-3.39716,-0.25,0.98712,-2.37081,-0.25,0.98712],
// 4 80 -0.54016 -0.25 0.7309 -0.19804 -0.25 1.67378 -1.10365 -0.25 1.67378 -0.74141 -0.25 0.72066
  [4,80,-0.54016,-0.25,0.7309,-0.19804,-0.25,1.67378,-1.10365,-0.25,1.67378,-0.74141,-0.25,0.72066],
// 3 0 -5.45845 -0.25 -1.25149 -5.55601 -0.25 -1.64895 -4.15817 -0.25 -2.31293
  [3,0,-5.45845,-0.25,-1.25149,-5.55601,-0.25,-1.64895,-4.15817,-0.25,-2.31293],
// 3 0 -5.55601 -0.25 -1.64895 -5.7999 -0.25 -2.0464 -4.15817 -0.25 -2.31293
  [3,0,-5.55601,-0.25,-1.64895,-5.7999,-0.25,-2.0464,-4.15817,-0.25,-2.31293],
// 3 80 -2.37081 -0.25 1.68403 -5.16812 -0.25 1.68403 -5.16812 -0.25 0.99737
  [3,80,-2.37081,-0.25,1.68403,-5.16812,-0.25,1.68403,-5.16812,-0.25,0.99737],
// 3 0 -0.19804 -0.25 1.67378 2.08553 -0.25 1.33557 2.48803 -0.25 1.59179
  [3,0,-0.19804,-0.25,1.67378,2.08553,-0.25,1.33557,2.48803,-0.25,1.59179],
// 3 0 1.49117 -0.25 0.10574 0.5365 -0.25 -0.35545 1.46602 -0.25 -0.43231
  [3,0,1.49117,-0.25,0.10574,0.5365,-0.25,-0.35545,1.46602,-0.25,-0.43231],
// 3 0 1.73335 -0.25 -1.63653 1.1503 -0.25 -2.29244 2.21634 -0.25 -2.09771
  [3,0,1.73335,-0.25,-1.63653,1.1503,-0.25,-2.29244,2.21634,-0.25,-2.09771],
// 4 0 17.5 -0.25 -7.5 1.1503 -0.25 -2.29244 0.42582 -0.25 -2.29244 -17.5 -0.25 -7.5
  [4,0,17.5,-0.25,-7.5,1.1503,-0.25,-2.29244,0.42582,-0.25,-2.29244,-17.5,-0.25,-7.5],
// 4 80 0.19439 -0.25 -1.55454 0.42582 -0.25 -2.29244 1.1503 -0.25 -2.29244 0.5365 -0.25 -0.35545
  [4,80,0.19439,-0.25,-1.55454,0.42582,-0.25,-2.29244,1.1503,-0.25,-2.29244,0.5365,-0.25,-0.35545],
// 4 0 0.42582 -0.25 -2.29244 0.19439 -0.25 -1.55454 -1.48601 -0.25 -1.56479 -1.74763 -0.25 -2.30269
  [4,0,0.42582,-0.25,-2.29244,0.19439,-0.25,-1.55454,-1.48601,-0.25,-1.56479,-1.74763,-0.25,-2.30269],
// 4 0 -2.47212 -0.25 -2.32318 -1.76776 -0.25 -0.23759 -2.37081 -0.25 0.98712 -3.39716 -0.25 0.98712
  [4,0,-2.47212,-0.25,-2.32318,-1.76776,-0.25,-0.23759,-2.37081,-0.25,0.98712,-3.39716,-0.25,0.98712],
// 4 80 -2.47212 -0.25 -2.32318 -1.74763 -0.25 -2.30269 -1.48601 -0.25 -1.56479 -1.76776 -0.25 -0.23759
  [4,80,-2.47212,-0.25,-2.32318,-1.74763,-0.25,-2.30269,-1.48601,-0.25,-1.56479,-1.76776,-0.25,-0.23759],
// 3 0 -3.39716 -0.25 0.98712 -3.40723 -0.25 -2.31293 -2.47212 -0.25 -2.32318
  [3,0,-3.39716,-0.25,0.98712,-3.40723,-0.25,-2.31293,-2.47212,-0.25,-2.32318],
// 4 80 0.5365 -0.25 -0.35545 -0.19804 -0.25 1.67378 -0.54016 -0.25 0.7309 -0.08736 -0.25 -0.81664
  [4,80,0.5365,-0.25,-0.35545,-0.19804,-0.25,1.67378,-0.54016,-0.25,0.7309,-0.08736,-0.25,-0.81664],
// 3 0 -17.5 -0.25 7.5 -2.37081 -0.25 1.68403 -1.10365 -0.25 1.67378
  [3,0,-17.5,-0.25,7.5,-2.37081,-0.25,1.68403,-1.10365,-0.25,1.67378],
// 3 0 5.88926 -0.25 1.69427 4.83254 -0.25 0.99737 5.05391 -0.25 0.46444
  [3,0,5.88926,-0.25,1.69427,4.83254,-0.25,0.99737,5.05391,-0.25,0.46444],
// 4 0 5.88926 -0.25 -2.30269 5.88926 -0.25 1.69427 5.05391 -0.25 0.46444 5.19478 -0.25 -0.15048
  [4,0,5.88926,-0.25,-2.30269,5.88926,-0.25,1.69427,5.05391,-0.25,0.46444,5.19478,-0.25,-0.15048],
// 4 0 8.40483 -0.25 0.15698 8.80732 -0.25 1.02811 6.59362 -0.25 1.02811 6.59362 -0.25 0.15698
  [4,0,8.40483,-0.25,0.15698,8.80732,-0.25,1.02811,6.59362,-0.25,1.02811,6.59362,-0.25,0.15698],
// 3 80 6.59362 -0.25 0.15698 5.88926 -0.25 -2.30269 6.59362 -0.25 -0.61166
  [3,80,6.59362,-0.25,0.15698,5.88926,-0.25,-2.30269,6.59362,-0.25,-0.61166],
// 4 0 8.80732 -0.25 1.02811 8.40483 -0.25 0.15698 8.40483 -0.25 -0.56042 8.75701 -0.25 -1.68777
  [4,0,8.80732,-0.25,1.02811,8.40483,-0.25,0.15698,8.40483,-0.25,-0.56042,8.75701,-0.25,-1.68777],
// 4 0 17.5 -0.25 -7.5 8.80732 -0.25 1.02811 8.75701 -0.25 -1.68777 8.75701 -0.25 -2.35393
  [4,0,17.5,-0.25,-7.5,8.80732,-0.25,1.02811,8.75701,-0.25,-1.68777,8.75701,-0.25,-2.35393],
// 4 80 8.75701 -0.25 -2.35393 8.75701 -0.25 -1.68777 6.59362 -0.25 -1.63653 5.88926 -0.25 -2.30269
  [4,80,8.75701,-0.25,-2.35393,8.75701,-0.25,-1.68777,6.59362,-0.25,-1.63653,5.88926,-0.25,-2.30269],
// 3 80 6.59362 -0.25 -0.61166 5.88926 -0.25 -2.30269 6.59362 -0.25 -1.63653
  [3,80,6.59362,-0.25,-0.61166,5.88926,-0.25,-2.30269,6.59362,-0.25,-1.63653],
// 4 0 8.40483 -0.25 -0.56042 6.59362 -0.25 -0.61166 6.59362 -0.25 -1.63653 8.75701 -0.25 -1.68777
  [4,0,8.40483,-0.25,-0.56042,6.59362,-0.25,-0.61166,6.59362,-0.25,-1.63653,8.75701,-0.25,-1.68777],
// 4 0 17.5 -0.25 -7.5 8.75701 -0.25 -2.35393 5.88926 -0.25 -2.30269 5.19478 -0.25 -2.35393
  [4,0,17.5,-0.25,-7.5,8.75701,-0.25,-2.35393,5.88926,-0.25,-2.30269,5.19478,-0.25,-2.35393],
// 3 0 5.19478 -0.25 -0.15048 5.19478 -0.25 -2.35393 5.88926 -0.25 -2.30269
  [3,0,5.19478,-0.25,-0.15048,5.19478,-0.25,-2.35393,5.88926,-0.25,-2.30269],
// 3 0 17.5 -0.25 7.5 5.88926 -0.25 1.69427 8.80732 -0.25 1.71477
  [3,0,17.5,-0.25,7.5,5.88926,-0.25,1.69427,8.80732,-0.25,1.71477],
// 3 0 5.88926 -0.25 1.69427 4.44011 -0.25 1.43806 4.83254 -0.25 0.99737
  [3,0,5.88926,-0.25,1.69427,4.44011,-0.25,1.43806,4.83254,-0.25,0.99737],
// 3 0 -17.5 -0.25 7.5 -8.19003 -0.25 1.38162 -7.75102 -0.25 1.58034
  [3,0,-17.5,-0.25,7.5,-8.19003,-0.25,1.38162,-7.75102,-0.25,1.58034],
// 3 0 -8.09247 -0.25 -2.14576 -17.5 -0.25 -7.5 -7.60469 -0.25 -2.34448
  [3,0,-8.09247,-0.25,-2.14576,-17.5,-0.25,-7.5,-7.60469,-0.25,-2.34448],
// 3 0 -8.53147 -0.25 -1.69863 -17.5 -0.25 -7.5 -8.09247 -0.25 -2.14576
  [3,0,-8.53147,-0.25,-1.69863,-17.5,-0.25,-7.5,-8.09247,-0.25,-2.14576],
// 4 0 -0.74141 -0.25 0.72066 -1.17744 -0.25 -0.81322 -0.08736 -0.25 -0.81664 -0.54016 -0.25 0.7309
  [4,0,-0.74141,-0.25,0.72066,-1.17744,-0.25,-0.81322,-0.08736,-0.25,-0.81664,-0.54016,-0.25,0.7309],
// 3 80 0.5365 -0.25 -0.35545 -0.08736 -0.25 -0.81664 0.19439 -0.25 -1.55454
  [3,80,0.5365,-0.25,-0.35545,-0.08736,-0.25,-0.81664,0.19439,-0.25,-1.55454],
// 4 80 -1.17744 -0.25 -0.81322 -0.74141 -0.25 0.72066 -1.76776 -0.25 -0.23759 -1.48601 -0.25 -1.56479
  [4,80,-1.17744,-0.25,-0.81322,-0.74141,-0.25,0.72066,-1.76776,-0.25,-0.23759,-1.48601,-0.25,-1.56479],
// 3 80 -1.10365 -0.25 1.67378 -1.76776 -0.25 -0.23759 -0.74141 -0.25 0.72066
  [3,80,-1.10365,-0.25,1.67378,-1.76776,-0.25,-0.23759,-0.74141,-0.25,0.72066],
// 3 0 -8.62903 -0.25 -1.20181 -17.5 -0.25 -7.5 -8.53147 -0.25 -1.69863
  [3,0,-8.62903,-0.25,-1.20181,-17.5,-0.25,-7.5,-8.53147,-0.25,-1.69863],
// 3 0 0.5365 -0.25 -0.35545 1.54149 -0.25 -0.97037 1.46602 -0.25 -0.43231
  [3,0,0.5365,-0.25,-0.35545,1.54149,-0.25,-0.97037,1.46602,-0.25,-0.43231],
// 3 80 2.05535 -0.25 -0.27858 1.46602 -0.25 -0.43231 2.08553 -0.25 -0.66291
  [3,80,2.05535,-0.25,-0.27858,1.46602,-0.25,-0.43231,2.08553,-0.25,-0.66291],
// 3 0 2.08553 -0.25 0.10574 2.05535 -0.25 -0.27858 3.454 -0.25 -0.09923
  [3,0,2.08553,-0.25,0.10574,2.05535,-0.25,-0.27858,3.454,-0.25,-0.09923],
// 3 80 -8.53147 -0.25 0.93449 -8.598 -0.25 0.58672 -7.7998 -0.25 0.78544
  [3,80,-8.53147,-0.25,0.93449,-8.598,-0.25,0.58672,-7.7998,-0.25,0.78544],
// 3 0 -17.5 -0.25 7.5 -8.598 -0.25 0.58672 -8.53147 -0.25 0.93449
  [3,0,-17.5,-0.25,7.5,-8.598,-0.25,0.58672,-8.53147,-0.25,0.93449],
// 3 0 -17.5 -0.25 7.5 -8.53147 -0.25 0.23895 -8.598 -0.25 0.58672
  [3,0,-17.5,-0.25,7.5,-8.53147,-0.25,0.23895,-8.598,-0.25,0.58672],
];
module ldraw_lib__6255869g(step=0, col=false, unit=2/5, alt=false, line=0.2, solid=!$preview)
    makepoly(ldraw_lib__6255869g(), step=step, col=col, unit=unit, alt=alt, line=line, solid=solid);
ldraw_lib__6255869g(line=0.2);
